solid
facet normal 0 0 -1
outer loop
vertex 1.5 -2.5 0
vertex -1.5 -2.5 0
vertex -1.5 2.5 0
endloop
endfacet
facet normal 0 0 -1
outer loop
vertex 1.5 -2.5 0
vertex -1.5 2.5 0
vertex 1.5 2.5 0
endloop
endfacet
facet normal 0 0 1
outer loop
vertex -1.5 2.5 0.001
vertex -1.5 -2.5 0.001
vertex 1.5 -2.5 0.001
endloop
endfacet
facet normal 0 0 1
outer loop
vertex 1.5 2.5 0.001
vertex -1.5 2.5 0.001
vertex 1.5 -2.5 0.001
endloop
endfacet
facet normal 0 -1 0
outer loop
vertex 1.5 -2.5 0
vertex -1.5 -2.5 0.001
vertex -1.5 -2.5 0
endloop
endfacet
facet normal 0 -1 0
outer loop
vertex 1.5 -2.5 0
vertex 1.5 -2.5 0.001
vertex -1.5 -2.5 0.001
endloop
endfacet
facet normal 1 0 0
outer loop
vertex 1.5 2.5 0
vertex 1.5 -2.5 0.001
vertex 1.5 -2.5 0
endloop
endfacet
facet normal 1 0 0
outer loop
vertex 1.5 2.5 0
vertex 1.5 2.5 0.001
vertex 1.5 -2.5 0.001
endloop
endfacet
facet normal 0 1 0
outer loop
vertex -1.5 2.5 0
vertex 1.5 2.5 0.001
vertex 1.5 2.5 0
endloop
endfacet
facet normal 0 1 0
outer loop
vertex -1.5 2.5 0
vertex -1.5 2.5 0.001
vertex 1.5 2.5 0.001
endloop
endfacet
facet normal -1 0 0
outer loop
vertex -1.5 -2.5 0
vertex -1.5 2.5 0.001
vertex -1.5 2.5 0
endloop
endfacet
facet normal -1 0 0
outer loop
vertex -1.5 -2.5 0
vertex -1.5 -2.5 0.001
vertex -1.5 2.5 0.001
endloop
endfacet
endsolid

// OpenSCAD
linear_extrude(height=0.001) {
    square(size=[3, 5], center=true);
};
